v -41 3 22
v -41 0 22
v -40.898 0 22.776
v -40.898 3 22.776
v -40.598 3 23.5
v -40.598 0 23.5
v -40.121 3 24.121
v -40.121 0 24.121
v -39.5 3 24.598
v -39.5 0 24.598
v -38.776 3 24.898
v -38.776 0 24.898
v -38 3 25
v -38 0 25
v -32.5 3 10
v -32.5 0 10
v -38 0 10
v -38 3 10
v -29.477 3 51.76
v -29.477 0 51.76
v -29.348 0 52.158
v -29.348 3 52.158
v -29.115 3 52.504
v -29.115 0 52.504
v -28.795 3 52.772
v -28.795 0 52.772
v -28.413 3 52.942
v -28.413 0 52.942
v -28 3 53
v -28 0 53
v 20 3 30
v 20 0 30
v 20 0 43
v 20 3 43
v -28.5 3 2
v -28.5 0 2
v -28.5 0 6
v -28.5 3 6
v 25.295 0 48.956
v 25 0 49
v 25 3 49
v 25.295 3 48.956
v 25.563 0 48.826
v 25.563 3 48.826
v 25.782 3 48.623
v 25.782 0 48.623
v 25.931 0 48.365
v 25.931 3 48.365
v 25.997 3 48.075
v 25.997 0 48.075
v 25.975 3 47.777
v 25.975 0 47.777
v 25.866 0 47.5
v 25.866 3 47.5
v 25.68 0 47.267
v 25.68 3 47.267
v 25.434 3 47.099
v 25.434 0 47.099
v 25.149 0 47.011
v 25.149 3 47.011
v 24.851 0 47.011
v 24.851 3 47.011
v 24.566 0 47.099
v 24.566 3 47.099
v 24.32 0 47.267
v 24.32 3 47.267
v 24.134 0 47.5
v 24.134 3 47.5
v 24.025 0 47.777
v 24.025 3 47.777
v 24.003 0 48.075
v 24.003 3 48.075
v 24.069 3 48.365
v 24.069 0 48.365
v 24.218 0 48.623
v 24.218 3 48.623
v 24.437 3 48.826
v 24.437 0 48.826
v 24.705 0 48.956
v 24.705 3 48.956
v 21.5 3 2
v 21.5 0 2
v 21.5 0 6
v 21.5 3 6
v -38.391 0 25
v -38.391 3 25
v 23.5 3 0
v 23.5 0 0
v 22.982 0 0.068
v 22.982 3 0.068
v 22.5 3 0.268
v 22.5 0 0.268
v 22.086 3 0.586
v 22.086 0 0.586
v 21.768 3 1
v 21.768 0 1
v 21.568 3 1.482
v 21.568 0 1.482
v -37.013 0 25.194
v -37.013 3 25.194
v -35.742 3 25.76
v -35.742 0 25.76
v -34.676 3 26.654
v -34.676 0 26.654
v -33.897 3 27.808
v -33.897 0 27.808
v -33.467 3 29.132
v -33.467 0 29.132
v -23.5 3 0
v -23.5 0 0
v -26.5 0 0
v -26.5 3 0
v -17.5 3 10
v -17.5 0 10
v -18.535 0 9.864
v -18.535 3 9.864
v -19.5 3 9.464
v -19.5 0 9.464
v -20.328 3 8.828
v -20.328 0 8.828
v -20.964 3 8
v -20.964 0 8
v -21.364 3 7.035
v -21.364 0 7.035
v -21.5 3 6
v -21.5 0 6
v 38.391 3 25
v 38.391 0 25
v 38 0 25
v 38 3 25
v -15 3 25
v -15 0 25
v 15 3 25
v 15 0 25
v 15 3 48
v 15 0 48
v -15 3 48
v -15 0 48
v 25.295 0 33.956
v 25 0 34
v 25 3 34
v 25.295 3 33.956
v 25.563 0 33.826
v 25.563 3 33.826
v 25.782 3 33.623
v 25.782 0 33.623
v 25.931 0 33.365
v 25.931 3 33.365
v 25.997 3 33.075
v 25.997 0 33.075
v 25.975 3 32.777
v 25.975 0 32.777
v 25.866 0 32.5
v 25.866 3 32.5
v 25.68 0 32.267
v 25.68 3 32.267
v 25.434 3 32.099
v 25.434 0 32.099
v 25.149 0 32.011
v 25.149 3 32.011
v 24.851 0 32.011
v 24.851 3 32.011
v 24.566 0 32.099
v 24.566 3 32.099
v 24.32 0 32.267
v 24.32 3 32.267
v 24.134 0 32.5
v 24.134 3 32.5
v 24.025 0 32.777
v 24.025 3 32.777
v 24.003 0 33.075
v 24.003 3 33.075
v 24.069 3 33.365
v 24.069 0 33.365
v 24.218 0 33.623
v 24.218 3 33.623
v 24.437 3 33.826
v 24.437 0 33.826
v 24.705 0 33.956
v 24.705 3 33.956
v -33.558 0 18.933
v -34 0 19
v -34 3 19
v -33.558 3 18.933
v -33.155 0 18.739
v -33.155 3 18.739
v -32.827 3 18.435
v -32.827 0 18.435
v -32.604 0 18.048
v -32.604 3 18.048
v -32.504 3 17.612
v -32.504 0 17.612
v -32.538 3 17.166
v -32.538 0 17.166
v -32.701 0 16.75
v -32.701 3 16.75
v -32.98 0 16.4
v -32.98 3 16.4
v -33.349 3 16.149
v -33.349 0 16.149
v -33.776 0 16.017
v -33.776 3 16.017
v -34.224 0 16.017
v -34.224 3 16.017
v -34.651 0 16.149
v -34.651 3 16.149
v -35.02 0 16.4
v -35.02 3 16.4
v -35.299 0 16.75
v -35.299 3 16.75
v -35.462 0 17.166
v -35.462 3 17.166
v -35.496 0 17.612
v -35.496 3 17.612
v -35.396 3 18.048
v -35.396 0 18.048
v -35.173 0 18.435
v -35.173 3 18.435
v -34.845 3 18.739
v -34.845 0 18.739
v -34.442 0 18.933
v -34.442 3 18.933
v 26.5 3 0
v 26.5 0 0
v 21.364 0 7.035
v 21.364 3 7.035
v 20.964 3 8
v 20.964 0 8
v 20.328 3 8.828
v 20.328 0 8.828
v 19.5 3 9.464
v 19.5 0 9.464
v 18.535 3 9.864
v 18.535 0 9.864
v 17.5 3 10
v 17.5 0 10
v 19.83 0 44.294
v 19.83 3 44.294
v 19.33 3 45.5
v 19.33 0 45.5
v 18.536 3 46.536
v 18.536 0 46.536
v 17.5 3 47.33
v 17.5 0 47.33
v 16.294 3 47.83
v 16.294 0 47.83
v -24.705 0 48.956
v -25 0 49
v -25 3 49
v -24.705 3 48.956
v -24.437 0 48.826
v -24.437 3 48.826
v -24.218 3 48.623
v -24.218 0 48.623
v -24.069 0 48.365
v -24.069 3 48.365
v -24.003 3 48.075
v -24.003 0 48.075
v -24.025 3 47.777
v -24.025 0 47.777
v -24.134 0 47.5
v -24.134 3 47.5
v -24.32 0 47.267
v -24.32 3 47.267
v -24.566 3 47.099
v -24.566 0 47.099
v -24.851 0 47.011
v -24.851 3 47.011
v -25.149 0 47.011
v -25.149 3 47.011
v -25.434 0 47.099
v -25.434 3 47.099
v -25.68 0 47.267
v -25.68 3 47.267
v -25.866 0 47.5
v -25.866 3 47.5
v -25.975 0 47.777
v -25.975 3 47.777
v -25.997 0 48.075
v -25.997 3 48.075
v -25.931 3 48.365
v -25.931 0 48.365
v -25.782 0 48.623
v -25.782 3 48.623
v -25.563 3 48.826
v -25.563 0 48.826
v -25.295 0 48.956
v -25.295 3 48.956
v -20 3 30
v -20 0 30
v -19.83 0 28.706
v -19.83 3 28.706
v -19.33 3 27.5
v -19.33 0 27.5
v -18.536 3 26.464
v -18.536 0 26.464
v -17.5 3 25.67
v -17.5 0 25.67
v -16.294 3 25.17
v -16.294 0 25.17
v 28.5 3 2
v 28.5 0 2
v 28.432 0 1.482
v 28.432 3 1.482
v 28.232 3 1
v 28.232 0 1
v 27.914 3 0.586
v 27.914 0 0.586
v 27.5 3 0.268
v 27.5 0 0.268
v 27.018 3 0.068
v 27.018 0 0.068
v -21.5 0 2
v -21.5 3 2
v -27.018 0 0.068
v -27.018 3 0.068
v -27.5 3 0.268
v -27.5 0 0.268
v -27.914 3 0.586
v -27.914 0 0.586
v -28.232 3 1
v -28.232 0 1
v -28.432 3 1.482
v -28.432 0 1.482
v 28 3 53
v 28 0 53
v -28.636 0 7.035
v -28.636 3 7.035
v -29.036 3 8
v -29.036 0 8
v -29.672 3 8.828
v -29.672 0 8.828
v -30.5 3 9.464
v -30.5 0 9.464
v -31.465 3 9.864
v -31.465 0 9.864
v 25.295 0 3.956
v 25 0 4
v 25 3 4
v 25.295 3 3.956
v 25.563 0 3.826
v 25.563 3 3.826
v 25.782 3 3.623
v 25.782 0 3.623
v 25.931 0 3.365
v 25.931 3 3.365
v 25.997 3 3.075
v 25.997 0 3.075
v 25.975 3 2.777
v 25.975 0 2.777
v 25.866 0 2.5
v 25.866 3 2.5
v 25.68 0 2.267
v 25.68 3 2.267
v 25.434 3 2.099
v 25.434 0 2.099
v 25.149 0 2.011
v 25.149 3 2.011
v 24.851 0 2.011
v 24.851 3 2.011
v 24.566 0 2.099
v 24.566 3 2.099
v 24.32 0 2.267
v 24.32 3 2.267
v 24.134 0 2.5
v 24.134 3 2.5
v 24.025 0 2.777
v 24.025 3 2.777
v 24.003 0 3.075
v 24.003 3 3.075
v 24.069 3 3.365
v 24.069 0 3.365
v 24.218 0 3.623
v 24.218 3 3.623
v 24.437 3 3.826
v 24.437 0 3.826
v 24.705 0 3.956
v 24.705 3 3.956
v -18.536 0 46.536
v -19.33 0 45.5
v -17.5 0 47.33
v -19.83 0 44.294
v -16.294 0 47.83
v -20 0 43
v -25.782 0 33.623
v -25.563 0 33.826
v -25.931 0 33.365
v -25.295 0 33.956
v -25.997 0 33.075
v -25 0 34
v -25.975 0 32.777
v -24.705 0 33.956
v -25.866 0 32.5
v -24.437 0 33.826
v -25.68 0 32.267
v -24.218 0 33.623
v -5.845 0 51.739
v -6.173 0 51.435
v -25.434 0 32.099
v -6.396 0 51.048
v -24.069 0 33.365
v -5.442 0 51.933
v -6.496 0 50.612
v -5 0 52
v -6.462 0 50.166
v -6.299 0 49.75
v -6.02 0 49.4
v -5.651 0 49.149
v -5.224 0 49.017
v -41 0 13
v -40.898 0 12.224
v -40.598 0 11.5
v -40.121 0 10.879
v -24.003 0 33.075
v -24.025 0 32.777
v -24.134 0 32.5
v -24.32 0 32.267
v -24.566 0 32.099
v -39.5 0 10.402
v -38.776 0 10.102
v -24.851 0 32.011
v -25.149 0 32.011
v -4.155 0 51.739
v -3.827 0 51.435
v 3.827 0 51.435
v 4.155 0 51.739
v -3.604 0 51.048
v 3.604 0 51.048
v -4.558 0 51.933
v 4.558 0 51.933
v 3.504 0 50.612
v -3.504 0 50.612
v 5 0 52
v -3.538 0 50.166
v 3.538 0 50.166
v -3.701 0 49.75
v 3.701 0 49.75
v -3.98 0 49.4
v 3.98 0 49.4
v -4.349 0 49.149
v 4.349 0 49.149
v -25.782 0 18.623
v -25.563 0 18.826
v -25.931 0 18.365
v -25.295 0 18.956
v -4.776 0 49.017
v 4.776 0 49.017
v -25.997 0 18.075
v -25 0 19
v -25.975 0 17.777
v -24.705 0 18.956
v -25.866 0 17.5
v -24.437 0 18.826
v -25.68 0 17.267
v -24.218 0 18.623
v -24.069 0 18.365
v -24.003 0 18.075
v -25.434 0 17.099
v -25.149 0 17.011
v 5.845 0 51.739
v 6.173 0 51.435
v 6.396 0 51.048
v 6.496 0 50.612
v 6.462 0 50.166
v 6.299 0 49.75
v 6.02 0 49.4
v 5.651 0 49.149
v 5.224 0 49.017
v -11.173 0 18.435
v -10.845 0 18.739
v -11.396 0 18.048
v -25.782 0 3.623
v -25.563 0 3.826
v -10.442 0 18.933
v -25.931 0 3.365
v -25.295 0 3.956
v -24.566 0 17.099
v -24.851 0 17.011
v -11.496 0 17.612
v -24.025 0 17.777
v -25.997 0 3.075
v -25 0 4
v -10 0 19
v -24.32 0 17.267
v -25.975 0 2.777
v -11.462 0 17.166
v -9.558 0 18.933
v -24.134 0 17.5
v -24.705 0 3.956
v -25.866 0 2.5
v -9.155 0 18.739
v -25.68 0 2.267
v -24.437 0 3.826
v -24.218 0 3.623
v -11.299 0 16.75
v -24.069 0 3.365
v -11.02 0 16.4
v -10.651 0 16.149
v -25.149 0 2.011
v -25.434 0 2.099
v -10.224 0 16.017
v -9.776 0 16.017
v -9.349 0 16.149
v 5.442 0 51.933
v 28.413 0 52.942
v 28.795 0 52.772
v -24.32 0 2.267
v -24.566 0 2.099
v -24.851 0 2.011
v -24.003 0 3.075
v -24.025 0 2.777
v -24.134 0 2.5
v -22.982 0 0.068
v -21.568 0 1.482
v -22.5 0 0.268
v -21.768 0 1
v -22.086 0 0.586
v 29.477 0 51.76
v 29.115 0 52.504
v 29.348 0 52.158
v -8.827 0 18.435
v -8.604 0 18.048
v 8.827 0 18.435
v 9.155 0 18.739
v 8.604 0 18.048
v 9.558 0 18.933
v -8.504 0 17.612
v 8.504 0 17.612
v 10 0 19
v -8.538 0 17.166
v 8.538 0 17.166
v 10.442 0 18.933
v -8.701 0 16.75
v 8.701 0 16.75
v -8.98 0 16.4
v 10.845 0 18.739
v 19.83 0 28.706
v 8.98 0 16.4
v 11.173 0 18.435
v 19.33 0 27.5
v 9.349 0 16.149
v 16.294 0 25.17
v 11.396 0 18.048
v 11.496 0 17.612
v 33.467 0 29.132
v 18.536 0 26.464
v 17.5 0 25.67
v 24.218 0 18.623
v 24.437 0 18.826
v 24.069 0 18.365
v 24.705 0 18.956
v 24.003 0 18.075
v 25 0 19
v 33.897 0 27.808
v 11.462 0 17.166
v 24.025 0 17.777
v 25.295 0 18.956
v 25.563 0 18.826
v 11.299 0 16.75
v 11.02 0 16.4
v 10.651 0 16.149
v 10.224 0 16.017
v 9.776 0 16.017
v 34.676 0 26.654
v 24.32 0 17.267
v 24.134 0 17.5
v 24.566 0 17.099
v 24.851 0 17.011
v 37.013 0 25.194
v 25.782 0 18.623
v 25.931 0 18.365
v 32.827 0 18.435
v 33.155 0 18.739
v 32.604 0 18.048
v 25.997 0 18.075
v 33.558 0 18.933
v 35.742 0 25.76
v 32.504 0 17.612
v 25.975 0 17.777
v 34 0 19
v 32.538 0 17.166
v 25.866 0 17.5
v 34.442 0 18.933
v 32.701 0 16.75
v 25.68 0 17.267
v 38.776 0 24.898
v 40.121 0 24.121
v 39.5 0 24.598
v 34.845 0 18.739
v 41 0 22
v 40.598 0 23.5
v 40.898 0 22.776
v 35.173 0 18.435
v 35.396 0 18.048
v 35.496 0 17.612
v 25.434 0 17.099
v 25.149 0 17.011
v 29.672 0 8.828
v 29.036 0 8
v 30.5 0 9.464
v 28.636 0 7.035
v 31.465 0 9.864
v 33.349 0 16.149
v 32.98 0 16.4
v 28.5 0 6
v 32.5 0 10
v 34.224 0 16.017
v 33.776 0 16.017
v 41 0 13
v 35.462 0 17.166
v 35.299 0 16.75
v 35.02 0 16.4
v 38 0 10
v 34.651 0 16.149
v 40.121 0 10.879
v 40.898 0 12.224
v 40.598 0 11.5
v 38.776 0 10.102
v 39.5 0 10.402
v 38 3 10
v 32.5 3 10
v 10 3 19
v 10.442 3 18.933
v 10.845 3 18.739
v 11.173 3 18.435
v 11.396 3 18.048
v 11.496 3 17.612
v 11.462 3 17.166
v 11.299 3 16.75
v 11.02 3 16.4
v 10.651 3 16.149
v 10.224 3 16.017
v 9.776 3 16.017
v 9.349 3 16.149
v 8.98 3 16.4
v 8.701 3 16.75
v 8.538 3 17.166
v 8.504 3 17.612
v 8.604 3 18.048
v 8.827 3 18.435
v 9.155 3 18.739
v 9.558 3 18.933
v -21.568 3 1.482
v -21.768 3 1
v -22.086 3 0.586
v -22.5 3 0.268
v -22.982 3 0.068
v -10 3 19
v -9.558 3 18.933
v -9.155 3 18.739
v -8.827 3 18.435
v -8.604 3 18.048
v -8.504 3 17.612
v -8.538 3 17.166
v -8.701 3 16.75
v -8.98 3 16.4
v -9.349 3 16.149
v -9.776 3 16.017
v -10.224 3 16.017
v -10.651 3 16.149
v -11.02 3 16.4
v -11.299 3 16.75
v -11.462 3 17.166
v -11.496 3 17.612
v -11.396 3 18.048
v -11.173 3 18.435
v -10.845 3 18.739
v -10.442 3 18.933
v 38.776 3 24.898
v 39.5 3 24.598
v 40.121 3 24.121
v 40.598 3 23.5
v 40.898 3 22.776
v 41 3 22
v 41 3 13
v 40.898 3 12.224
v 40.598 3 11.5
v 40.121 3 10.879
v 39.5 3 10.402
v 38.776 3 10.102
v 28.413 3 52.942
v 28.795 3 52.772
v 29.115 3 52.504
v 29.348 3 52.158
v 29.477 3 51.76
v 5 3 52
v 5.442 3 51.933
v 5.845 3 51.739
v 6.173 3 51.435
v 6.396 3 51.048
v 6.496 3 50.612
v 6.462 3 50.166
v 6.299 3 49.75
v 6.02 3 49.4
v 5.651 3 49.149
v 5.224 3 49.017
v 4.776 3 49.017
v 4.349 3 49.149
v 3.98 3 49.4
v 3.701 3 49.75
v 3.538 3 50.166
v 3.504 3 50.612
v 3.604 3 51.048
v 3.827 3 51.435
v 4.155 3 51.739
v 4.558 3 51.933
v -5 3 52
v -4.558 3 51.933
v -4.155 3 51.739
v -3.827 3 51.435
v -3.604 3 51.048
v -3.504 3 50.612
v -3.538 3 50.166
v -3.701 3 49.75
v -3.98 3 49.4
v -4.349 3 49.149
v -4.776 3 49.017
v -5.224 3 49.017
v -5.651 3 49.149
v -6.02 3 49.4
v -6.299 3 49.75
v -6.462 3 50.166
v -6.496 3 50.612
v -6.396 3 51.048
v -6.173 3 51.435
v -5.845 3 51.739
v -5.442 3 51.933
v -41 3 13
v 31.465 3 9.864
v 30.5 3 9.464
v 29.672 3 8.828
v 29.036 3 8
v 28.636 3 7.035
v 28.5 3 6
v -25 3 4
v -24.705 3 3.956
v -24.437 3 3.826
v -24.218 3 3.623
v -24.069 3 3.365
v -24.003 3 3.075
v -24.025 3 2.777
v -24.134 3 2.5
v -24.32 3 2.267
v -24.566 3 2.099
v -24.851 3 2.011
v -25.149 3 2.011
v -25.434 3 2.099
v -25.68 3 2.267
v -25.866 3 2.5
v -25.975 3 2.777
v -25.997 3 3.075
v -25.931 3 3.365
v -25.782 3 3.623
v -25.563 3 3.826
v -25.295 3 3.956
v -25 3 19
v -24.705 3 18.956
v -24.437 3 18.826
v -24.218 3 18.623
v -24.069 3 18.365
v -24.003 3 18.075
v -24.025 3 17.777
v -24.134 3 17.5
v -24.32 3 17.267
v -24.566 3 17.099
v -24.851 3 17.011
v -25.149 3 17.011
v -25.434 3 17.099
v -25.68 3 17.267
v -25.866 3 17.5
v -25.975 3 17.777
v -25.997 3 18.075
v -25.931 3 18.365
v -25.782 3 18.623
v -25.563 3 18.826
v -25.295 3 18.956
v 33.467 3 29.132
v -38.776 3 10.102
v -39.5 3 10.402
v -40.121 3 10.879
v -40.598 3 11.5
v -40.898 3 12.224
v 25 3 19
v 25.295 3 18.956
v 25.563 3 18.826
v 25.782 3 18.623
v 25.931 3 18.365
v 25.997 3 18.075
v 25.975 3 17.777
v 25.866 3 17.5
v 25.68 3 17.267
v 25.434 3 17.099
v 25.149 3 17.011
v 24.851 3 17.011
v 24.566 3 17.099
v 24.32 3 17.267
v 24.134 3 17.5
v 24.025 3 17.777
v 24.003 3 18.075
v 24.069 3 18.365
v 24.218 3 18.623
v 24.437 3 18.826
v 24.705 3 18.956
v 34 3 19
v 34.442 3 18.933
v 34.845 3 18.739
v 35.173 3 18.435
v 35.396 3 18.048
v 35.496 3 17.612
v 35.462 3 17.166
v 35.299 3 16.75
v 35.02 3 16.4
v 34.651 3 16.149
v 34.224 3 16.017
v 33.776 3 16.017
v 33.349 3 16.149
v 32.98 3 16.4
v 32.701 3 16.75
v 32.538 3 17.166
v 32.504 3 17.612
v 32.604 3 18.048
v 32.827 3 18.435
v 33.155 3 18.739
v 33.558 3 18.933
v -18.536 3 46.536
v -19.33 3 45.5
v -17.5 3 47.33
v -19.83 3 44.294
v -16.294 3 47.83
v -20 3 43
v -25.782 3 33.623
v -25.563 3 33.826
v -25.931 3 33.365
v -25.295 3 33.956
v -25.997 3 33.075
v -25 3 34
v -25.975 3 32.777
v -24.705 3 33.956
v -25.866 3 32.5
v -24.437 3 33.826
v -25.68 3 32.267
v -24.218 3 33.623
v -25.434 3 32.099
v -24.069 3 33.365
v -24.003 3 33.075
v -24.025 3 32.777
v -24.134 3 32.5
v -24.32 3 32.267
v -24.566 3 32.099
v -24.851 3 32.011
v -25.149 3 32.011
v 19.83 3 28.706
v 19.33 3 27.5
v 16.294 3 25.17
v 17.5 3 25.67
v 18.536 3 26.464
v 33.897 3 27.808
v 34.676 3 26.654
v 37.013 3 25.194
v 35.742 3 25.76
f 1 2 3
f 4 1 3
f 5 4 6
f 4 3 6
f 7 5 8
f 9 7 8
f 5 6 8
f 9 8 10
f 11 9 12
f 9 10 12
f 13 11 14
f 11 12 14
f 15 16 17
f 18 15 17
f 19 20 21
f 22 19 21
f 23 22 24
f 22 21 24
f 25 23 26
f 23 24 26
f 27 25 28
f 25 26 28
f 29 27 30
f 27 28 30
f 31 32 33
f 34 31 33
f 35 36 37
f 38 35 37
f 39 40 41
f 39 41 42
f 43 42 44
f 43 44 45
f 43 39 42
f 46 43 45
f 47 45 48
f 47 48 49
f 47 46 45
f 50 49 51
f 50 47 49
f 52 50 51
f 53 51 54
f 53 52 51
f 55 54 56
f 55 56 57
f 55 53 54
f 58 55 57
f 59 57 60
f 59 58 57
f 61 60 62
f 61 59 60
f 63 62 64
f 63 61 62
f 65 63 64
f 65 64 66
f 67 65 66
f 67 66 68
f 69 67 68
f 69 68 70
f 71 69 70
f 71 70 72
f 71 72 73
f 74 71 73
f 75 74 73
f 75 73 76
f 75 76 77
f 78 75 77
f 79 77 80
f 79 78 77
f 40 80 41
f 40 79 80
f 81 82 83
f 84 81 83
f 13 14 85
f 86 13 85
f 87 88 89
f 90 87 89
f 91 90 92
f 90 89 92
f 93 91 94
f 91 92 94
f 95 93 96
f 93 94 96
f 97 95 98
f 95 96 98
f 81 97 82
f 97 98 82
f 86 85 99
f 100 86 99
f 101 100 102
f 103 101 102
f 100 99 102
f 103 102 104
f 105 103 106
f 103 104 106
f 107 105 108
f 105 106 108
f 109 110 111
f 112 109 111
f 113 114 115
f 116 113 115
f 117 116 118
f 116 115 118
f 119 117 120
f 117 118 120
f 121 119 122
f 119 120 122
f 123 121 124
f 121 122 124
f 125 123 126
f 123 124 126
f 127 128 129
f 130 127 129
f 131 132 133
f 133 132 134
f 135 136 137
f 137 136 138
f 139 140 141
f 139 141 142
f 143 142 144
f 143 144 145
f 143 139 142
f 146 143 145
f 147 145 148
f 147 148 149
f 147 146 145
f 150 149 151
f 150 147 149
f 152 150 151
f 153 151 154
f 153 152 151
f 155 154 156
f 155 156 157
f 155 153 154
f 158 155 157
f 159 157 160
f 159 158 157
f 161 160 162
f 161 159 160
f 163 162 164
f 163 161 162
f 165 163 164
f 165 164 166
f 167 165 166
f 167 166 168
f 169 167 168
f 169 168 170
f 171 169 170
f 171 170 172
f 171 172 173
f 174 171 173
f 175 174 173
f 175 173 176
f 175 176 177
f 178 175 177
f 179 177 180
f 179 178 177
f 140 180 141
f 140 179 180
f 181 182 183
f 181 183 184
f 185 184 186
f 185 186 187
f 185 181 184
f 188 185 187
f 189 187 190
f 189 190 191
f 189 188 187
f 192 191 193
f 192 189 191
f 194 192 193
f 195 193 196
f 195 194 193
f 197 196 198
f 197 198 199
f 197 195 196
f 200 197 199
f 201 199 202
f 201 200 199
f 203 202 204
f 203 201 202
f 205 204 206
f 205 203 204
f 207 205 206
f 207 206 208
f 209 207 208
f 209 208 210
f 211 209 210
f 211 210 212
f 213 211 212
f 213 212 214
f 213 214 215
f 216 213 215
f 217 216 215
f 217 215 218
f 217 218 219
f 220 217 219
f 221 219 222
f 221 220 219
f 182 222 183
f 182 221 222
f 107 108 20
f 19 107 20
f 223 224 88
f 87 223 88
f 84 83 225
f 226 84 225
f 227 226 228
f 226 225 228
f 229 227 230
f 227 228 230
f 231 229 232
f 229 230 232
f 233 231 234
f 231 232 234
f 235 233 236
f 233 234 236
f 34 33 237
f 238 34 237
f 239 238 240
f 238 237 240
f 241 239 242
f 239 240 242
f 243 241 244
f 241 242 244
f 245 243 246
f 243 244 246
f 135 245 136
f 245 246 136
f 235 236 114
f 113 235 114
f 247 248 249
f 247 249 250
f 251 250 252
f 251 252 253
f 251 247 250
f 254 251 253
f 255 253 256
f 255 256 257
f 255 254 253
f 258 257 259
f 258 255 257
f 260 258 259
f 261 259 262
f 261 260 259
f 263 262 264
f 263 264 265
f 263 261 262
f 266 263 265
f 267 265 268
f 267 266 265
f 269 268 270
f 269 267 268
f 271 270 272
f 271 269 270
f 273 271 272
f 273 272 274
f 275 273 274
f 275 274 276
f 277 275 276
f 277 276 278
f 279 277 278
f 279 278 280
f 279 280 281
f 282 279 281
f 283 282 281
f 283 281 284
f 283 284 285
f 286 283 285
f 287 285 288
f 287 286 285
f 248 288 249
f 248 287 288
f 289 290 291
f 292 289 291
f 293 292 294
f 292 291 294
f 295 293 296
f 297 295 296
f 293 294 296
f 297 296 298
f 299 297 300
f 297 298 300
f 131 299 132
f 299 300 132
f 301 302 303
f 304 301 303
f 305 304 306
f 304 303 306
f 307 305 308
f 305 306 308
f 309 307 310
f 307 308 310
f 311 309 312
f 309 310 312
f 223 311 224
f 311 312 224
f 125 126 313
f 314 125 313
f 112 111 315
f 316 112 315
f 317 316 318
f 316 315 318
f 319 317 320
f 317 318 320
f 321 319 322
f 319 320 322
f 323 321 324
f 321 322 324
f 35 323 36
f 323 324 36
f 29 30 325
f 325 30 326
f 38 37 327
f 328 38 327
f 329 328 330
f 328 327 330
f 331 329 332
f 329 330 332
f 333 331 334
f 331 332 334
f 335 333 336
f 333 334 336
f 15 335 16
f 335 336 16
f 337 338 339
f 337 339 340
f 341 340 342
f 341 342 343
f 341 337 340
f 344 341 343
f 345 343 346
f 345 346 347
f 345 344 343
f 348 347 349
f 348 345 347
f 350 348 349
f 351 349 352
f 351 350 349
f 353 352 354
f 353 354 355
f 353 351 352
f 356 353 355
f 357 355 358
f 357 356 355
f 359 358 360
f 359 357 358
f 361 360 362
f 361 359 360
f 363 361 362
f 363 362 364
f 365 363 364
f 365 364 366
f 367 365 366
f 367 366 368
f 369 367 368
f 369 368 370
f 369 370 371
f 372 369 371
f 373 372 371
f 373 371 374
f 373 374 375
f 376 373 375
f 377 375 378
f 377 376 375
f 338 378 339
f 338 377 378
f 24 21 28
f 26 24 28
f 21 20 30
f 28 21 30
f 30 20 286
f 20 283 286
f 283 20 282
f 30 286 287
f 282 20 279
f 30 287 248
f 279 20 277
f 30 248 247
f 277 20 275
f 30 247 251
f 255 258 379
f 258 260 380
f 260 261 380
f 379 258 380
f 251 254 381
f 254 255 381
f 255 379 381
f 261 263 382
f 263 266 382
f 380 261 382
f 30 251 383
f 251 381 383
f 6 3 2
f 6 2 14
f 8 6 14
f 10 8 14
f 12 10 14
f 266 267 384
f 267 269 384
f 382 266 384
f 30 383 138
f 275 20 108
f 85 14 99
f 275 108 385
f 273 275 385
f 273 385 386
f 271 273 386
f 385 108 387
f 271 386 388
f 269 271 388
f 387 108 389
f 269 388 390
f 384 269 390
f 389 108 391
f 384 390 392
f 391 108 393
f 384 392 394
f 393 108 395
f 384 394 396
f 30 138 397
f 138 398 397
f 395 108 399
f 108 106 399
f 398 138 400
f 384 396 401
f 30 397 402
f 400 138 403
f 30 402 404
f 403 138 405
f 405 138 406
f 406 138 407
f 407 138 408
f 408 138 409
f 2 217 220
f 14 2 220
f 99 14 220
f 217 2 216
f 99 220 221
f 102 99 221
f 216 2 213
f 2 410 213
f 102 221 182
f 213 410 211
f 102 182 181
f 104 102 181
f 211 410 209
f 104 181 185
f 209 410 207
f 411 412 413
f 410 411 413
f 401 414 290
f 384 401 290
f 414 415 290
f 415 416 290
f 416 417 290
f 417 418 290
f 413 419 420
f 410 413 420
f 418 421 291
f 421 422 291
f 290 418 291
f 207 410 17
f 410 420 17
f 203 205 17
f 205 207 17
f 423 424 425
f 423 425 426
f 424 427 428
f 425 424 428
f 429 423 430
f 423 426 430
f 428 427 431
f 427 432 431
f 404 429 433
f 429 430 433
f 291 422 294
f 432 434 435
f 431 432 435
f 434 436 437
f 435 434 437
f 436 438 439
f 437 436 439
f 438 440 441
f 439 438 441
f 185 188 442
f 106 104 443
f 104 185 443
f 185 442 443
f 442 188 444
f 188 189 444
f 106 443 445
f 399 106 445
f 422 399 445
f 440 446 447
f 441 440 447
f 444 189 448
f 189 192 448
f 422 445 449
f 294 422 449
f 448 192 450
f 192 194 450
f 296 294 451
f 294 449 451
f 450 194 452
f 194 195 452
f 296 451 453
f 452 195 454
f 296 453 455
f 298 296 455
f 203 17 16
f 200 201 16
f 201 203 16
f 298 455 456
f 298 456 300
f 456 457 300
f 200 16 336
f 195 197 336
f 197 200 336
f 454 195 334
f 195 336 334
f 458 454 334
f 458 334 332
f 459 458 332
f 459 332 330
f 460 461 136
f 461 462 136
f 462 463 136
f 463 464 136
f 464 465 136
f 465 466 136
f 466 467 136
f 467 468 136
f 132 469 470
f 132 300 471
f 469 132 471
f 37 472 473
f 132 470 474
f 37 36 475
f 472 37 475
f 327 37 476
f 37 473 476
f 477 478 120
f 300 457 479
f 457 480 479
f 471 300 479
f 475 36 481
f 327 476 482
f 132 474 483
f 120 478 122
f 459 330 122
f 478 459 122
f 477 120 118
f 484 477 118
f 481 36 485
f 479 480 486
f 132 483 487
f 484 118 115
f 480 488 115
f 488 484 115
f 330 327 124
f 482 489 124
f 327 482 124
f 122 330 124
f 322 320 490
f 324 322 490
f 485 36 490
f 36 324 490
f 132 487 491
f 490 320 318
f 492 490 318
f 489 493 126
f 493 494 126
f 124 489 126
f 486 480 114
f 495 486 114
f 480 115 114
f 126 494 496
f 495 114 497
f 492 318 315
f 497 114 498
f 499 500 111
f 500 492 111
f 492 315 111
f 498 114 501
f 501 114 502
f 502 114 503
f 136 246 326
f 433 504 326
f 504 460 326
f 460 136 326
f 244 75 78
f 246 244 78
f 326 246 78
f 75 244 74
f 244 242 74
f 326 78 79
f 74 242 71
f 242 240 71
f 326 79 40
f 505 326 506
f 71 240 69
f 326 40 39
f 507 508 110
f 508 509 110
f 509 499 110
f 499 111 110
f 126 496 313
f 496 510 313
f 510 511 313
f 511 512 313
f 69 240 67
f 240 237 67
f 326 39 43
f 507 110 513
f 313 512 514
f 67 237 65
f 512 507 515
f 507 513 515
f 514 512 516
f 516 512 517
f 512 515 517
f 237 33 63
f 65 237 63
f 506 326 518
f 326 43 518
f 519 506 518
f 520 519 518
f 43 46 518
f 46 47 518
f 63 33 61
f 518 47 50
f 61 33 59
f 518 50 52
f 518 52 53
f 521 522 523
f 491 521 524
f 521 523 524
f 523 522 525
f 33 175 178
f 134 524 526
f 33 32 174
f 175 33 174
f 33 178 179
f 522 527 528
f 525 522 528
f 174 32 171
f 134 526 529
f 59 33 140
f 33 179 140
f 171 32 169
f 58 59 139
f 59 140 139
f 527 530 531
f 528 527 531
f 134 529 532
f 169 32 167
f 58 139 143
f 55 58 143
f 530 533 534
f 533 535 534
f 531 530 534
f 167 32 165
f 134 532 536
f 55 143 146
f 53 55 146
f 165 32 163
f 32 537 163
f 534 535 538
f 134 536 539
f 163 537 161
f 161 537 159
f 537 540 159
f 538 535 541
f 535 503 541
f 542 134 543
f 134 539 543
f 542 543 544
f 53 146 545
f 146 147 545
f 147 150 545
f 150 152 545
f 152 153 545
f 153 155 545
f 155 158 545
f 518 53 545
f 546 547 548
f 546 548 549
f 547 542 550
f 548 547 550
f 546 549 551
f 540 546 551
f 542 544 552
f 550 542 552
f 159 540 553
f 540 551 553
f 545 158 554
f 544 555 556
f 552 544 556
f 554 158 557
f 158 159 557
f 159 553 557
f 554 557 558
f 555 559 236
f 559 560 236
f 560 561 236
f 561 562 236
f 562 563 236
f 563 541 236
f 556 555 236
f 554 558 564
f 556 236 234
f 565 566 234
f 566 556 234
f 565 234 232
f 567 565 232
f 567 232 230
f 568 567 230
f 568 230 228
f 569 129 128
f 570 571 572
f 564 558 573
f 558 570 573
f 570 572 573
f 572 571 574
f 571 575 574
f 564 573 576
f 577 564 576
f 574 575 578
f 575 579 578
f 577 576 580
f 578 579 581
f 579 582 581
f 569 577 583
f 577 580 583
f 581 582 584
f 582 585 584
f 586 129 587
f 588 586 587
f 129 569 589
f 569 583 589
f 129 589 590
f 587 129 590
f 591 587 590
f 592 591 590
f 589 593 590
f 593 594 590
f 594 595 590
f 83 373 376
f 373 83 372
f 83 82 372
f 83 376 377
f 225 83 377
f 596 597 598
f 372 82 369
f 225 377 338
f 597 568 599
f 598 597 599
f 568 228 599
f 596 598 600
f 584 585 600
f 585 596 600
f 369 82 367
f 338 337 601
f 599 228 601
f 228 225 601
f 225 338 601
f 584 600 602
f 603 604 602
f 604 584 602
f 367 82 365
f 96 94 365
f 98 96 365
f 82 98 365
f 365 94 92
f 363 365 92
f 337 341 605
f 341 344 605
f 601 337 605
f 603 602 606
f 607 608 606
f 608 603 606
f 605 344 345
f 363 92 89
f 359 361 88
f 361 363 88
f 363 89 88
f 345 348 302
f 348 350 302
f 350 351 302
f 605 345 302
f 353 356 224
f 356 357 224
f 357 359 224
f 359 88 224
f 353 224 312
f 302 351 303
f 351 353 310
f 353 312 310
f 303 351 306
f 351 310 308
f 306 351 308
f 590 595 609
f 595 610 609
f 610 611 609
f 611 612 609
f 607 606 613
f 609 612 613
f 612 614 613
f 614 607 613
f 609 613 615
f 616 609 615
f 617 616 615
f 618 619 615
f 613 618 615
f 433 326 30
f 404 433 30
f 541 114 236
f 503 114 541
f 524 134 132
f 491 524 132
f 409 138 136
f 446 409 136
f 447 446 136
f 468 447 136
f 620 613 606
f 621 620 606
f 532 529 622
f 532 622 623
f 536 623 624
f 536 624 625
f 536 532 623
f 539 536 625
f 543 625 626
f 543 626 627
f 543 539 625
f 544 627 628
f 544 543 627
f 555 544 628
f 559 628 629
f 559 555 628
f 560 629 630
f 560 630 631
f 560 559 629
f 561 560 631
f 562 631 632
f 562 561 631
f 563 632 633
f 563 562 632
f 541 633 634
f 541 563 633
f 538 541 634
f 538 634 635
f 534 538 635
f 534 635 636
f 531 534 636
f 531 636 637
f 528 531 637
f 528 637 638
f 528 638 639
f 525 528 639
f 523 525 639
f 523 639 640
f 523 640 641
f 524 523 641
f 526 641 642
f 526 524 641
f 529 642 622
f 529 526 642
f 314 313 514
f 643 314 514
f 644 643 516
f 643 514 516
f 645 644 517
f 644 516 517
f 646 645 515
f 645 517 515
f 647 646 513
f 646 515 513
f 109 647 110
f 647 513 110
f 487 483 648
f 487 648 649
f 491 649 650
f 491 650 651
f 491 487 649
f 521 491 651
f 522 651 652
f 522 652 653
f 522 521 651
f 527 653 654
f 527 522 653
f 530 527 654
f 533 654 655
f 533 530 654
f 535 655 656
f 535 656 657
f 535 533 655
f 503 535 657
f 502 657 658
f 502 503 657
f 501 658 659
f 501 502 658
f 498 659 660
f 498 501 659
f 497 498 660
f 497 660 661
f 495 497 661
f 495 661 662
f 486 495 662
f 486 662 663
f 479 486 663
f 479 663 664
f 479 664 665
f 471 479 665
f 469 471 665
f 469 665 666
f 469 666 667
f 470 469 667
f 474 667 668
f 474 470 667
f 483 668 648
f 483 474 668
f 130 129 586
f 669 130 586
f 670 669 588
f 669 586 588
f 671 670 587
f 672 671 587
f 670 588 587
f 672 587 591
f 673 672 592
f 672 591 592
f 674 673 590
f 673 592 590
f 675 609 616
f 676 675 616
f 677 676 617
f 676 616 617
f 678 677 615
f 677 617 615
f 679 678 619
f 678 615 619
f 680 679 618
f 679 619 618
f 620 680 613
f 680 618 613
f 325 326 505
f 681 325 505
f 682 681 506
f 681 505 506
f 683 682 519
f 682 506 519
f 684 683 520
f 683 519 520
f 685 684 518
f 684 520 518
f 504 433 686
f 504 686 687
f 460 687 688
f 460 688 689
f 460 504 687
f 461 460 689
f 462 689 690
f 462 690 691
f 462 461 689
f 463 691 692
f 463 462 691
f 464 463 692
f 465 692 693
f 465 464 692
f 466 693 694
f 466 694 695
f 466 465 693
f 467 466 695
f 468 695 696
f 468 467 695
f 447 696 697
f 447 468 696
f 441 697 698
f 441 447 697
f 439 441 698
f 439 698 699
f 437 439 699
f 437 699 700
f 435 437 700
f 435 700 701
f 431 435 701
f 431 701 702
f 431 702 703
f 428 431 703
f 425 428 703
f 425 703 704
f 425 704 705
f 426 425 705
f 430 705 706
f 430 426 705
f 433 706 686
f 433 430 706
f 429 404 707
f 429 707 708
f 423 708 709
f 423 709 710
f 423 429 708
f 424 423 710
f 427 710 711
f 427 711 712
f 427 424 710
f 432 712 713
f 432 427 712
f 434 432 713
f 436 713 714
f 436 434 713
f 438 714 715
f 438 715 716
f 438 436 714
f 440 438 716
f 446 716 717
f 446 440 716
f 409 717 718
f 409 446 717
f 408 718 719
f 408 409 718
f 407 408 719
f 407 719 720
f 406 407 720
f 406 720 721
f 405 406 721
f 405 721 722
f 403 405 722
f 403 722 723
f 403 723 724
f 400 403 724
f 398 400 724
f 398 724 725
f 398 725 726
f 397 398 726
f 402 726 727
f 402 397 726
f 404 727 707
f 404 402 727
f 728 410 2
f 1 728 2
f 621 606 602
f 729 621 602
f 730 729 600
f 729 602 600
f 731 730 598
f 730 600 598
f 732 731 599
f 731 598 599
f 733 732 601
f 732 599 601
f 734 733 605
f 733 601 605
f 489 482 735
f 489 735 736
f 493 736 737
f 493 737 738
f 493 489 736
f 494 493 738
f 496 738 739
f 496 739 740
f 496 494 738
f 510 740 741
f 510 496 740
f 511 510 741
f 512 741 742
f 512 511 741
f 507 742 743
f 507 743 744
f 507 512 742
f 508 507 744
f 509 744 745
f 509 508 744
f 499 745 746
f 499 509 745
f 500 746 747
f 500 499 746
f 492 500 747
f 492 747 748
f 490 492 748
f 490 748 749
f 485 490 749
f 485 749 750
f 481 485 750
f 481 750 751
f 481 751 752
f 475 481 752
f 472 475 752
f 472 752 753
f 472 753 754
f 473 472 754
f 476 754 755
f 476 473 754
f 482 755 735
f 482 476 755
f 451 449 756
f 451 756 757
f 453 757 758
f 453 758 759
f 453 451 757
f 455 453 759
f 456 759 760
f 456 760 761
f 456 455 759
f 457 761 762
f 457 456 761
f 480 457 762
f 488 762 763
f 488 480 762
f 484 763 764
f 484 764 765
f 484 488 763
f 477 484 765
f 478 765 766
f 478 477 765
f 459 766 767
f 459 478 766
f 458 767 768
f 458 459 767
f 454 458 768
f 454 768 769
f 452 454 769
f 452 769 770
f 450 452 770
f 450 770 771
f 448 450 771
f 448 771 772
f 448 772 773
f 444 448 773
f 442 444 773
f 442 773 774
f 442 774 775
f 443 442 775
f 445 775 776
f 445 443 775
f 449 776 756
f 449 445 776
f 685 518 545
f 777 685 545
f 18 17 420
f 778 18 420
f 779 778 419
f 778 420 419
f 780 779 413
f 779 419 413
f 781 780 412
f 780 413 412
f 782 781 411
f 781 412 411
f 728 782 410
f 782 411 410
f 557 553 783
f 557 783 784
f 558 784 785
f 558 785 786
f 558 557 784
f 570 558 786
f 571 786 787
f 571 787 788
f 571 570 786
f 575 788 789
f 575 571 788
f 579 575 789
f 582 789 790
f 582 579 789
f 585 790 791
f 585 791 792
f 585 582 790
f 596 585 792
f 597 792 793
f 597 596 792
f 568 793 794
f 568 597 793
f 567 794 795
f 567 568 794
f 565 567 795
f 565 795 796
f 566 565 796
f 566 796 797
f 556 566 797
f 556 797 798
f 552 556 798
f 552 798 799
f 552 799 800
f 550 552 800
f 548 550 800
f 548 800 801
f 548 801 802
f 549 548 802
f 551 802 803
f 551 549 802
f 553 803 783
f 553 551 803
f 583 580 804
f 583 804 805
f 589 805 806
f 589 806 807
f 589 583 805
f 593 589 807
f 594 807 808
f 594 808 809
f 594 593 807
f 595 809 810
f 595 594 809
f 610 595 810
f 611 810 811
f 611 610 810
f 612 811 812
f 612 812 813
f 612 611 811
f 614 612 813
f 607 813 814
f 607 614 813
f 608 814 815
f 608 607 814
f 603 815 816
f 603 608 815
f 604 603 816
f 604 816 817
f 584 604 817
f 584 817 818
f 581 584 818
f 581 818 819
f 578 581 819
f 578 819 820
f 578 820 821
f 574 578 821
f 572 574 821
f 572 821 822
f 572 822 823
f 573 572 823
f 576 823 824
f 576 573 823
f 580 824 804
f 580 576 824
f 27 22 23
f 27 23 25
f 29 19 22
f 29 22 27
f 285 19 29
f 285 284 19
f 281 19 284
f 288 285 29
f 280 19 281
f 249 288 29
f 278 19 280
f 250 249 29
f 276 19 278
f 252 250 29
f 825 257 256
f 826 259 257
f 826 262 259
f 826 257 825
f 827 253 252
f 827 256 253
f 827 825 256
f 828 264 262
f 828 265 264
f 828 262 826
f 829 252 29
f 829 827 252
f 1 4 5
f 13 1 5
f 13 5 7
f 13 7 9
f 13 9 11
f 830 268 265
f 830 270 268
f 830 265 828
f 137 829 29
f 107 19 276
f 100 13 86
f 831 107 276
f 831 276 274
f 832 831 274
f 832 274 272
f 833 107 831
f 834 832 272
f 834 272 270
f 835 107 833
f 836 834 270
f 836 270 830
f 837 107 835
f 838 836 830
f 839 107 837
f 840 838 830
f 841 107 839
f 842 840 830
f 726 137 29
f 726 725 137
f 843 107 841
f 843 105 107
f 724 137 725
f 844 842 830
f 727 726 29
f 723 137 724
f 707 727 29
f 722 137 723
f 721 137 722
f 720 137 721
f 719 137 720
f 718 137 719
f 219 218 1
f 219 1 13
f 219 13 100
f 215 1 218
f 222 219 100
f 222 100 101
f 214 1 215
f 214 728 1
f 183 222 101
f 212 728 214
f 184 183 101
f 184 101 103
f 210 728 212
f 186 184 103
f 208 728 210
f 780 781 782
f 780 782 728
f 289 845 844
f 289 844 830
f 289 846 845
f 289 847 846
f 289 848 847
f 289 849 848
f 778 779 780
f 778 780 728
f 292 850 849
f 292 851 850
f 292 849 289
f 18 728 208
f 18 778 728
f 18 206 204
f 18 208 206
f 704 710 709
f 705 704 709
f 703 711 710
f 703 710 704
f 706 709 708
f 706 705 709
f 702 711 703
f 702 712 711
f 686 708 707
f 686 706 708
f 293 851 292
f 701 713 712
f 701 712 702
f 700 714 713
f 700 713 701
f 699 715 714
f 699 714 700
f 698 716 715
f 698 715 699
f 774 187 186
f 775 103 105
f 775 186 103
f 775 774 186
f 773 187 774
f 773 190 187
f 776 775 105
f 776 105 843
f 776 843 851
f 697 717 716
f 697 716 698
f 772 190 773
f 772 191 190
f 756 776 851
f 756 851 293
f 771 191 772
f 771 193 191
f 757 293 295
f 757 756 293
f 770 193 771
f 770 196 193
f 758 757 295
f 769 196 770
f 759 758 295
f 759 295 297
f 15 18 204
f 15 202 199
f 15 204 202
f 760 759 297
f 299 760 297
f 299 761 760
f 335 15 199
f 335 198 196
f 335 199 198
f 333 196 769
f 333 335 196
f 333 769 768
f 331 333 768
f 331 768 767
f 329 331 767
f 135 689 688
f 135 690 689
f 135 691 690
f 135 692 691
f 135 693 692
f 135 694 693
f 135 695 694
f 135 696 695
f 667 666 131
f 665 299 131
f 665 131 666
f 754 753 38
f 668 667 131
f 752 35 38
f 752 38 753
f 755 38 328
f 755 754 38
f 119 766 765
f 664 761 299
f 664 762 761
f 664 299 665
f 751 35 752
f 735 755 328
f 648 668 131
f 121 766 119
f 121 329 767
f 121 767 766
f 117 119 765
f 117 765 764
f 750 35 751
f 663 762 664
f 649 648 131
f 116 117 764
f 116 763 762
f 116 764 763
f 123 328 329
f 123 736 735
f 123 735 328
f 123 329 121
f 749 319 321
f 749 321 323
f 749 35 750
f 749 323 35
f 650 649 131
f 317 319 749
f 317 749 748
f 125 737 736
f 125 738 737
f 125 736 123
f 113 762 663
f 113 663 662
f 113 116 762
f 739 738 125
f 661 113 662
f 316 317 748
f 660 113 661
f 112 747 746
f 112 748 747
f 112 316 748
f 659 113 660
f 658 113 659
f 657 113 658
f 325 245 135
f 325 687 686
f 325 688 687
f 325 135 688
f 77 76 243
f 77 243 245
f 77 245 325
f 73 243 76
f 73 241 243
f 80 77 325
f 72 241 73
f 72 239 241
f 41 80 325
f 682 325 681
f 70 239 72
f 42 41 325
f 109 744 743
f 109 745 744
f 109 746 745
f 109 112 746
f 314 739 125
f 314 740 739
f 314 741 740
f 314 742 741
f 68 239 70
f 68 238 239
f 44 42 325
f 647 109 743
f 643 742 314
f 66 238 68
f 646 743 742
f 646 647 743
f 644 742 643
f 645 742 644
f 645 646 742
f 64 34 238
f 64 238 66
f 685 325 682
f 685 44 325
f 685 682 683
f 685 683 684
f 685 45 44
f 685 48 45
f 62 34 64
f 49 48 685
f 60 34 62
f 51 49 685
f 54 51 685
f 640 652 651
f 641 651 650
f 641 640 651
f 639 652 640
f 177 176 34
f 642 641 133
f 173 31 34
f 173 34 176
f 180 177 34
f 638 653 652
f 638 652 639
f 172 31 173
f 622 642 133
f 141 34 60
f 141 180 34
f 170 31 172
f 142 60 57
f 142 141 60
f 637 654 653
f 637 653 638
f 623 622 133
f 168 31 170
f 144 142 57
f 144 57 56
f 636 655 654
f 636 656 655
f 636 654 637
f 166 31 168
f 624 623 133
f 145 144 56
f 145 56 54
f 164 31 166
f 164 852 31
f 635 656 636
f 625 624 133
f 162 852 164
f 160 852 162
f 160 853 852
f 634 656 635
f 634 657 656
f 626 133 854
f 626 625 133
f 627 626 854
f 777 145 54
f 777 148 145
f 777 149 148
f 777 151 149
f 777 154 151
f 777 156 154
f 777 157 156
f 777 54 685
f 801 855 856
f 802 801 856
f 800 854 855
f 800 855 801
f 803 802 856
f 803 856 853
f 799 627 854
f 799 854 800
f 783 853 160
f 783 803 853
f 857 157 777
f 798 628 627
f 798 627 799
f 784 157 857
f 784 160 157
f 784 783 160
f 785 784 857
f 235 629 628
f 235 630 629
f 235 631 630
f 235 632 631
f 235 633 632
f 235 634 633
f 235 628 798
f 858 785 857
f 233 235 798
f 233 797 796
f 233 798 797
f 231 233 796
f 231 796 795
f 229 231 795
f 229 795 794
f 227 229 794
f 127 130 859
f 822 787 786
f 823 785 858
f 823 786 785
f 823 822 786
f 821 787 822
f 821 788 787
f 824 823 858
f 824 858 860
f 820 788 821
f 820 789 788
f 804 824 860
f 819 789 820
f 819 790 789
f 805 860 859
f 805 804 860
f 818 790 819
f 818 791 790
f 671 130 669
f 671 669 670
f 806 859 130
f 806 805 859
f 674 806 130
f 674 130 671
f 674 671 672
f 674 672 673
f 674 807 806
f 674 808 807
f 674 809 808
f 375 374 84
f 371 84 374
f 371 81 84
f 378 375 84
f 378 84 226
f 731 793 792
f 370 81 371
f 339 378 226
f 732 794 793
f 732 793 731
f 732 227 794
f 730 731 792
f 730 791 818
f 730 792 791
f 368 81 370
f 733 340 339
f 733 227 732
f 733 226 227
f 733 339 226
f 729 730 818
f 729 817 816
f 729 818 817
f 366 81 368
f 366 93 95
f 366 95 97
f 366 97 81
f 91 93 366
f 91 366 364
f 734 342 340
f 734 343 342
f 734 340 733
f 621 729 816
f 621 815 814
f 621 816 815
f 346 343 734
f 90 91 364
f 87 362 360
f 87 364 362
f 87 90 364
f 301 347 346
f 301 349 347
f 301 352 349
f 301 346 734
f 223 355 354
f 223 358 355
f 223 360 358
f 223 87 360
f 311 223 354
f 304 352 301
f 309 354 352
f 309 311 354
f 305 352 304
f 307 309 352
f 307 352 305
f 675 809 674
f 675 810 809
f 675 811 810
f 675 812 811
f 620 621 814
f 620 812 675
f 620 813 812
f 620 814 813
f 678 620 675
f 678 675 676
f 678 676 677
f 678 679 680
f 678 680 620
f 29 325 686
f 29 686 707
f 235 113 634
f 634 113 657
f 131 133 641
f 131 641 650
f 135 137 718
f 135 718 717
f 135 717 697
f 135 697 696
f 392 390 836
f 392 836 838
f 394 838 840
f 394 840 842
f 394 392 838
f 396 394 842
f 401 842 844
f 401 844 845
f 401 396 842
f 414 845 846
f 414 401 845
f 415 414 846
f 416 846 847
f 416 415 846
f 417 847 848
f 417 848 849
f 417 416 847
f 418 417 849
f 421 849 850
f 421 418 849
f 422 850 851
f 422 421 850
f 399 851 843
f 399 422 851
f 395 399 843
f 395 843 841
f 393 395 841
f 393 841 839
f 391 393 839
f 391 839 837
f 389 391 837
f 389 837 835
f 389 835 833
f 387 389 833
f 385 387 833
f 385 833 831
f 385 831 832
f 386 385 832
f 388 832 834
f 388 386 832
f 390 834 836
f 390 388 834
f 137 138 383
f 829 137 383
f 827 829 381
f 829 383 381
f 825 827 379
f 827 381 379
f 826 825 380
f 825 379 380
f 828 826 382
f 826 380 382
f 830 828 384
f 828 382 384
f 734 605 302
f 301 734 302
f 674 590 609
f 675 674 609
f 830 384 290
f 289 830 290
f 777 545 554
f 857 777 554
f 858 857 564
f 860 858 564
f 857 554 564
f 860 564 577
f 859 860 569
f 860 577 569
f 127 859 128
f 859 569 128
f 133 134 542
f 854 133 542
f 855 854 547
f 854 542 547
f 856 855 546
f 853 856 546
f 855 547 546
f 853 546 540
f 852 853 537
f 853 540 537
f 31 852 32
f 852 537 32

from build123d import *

# Parameters (mm, degrees)
SKETCH_1_R      = 1
SKETCH_1_R_2    = 1.5
EXTRUDE_1_DEPTH = 3


with BuildPart() as part:
    # 草图1 → 凸台-拉伸1 (new body)
    with BuildSketch(Plane(origin=(0, 0, 0), x_dir=(1, 0, 0), z_dir=(0, 1, 0))):
        with BuildLine():
            Line((-28.5, -2), (-28.5, -6))
            ThreePointArc((-28.5, -6), (-29.671572875, -8.828427125), (-32.5, -10))
            Line((-32.5, -10), (-38, -10))
            ThreePointArc((-38, -10), (-40.121320344, -10.878679656), (-41, -13))
            Line((-41, -13), (-41, -22))
            ThreePointArc((-41, -22), (-40.121320344, -24.121320344), (-38, -25))
            Line((-38, -25), (-38.391303062, -25))
            ThreePointArc((-38.391303062, -25), (-35.177365014, -26.169777784), (-33.467264297, -29.131759112))
            Line((-33.467264297, -29.131759112), (-29.47721163, -51.760472267))
            ThreePointArc((-29.47721163, -51.760472267), (-28.964181415, -52.649066665), (-28, -53))
            Line((-28, -53), (-22, -53))
            Line((-22, -53), (22, -53))
            Line((22, -53), (28, -53))
            ThreePointArc((28, -53), (28.964181415, -52.649066665), (29.47721163, -51.760472267))
            Line((29.47721163, -51.760472267), (33.467264297, -29.131759112))
            ThreePointArc((33.467264297, -29.131759112), (35.177365014, -26.169777784), (38.391303062, -25))
            Line((38.391303062, -25), (38, -25))
            ThreePointArc((38, -25), (40.121320344, -24.121320344), (41, -22))
            Line((41, -22), (41, -13))
            ThreePointArc((41, -13), (40.121320344, -10.878679656), (38, -10))
            Line((38, -10), (32.5, -10))
            ThreePointArc((32.5, -10), (29.671572875, -8.828427125), (28.5, -6))
            Line((28.5, -6), (28.5, -2))
            ThreePointArc((28.5, -2), (27.914213562, -0.585786438), (26.5, 0))
            Line((26.5, 0), (23.5, 0))
            ThreePointArc((23.5, 0), (22.085786438, -0.585786438), (21.5, -2))
            Line((21.5, -2), (21.5, -6))
            ThreePointArc((21.5, -6), (20.328427125, -8.828427125), (17.5, -10))
            Line((17.5, -10), (-17.5, -10))
            ThreePointArc((-17.5, -10), (-20.328427125, -8.828427125), (-21.5, -6))
            Line((-21.5, -6), (-21.5, -2))
            ThreePointArc((-21.5, -2), (-22.085786438, -0.585786438), (-23.5, 0))
            Line((-23.5, 0), (-26.5, 0))
            ThreePointArc((-26.5, 0), (-27.914213562, -0.585786438), (-28.5, -2))
        make_face()
        with Locations(Location((-25, -48, 0), (0, 0, 270))):
            Circle(SKETCH_1_R, mode=Mode.SUBTRACT)
        with Locations(Location((-25, -33, 0), (0, 0, 270))):
            Circle(SKETCH_1_R, mode=Mode.SUBTRACT)
        with Locations(Location((-25, -18, 0), (0, 0, 270))):
            Circle(SKETCH_1_R, mode=Mode.SUBTRACT)
        with Locations(Location((-34, -17.5, 0), (0, 0, 270))):
            Circle(SKETCH_1_R_2, mode=Mode.SUBTRACT)
        with Locations(Location((-10, -17.5, 0), (0, 0, 270))):
            Circle(SKETCH_1_R_2, mode=Mode.SUBTRACT)
        with Locations(Location((10, -17.5, 0), (0, 0, 270))):
            Circle(SKETCH_1_R_2, mode=Mode.SUBTRACT)
        with Locations(Location((34, -17.5, 0), (0, 0, 270))):
            Circle(SKETCH_1_R_2, mode=Mode.SUBTRACT)
        with Locations(Location((25, -18, 0), (0, 0, 270))):
            Circle(SKETCH_1_R, mode=Mode.SUBTRACT)
        with Locations(Location((25, -33, 0), (0, 0, 270))):
            Circle(SKETCH_1_R, mode=Mode.SUBTRACT)
        with Locations(Location((25, -48, 0), (0, 0, 270))):
            Circle(SKETCH_1_R, mode=Mode.SUBTRACT)
        with Locations(Location((-25, -3, 0), (0, 0, 270))):
            Circle(SKETCH_1_R, mode=Mode.SUBTRACT)
        with Locations(Location((25, -3, 0), (0, 0, 270))):
            Circle(SKETCH_1_R, mode=Mode.SUBTRACT)
        with Locations(Location((5, -50.5, 0), (0, 0, 270))):
            Circle(SKETCH_1_R_2, mode=Mode.SUBTRACT)
        with Locations(Location((-5, -50.5, 0), (0, 0, 270))):
            Circle(SKETCH_1_R_2, mode=Mode.SUBTRACT)
        with BuildLine():
            Line((-20, -43), (-20, -30))
            ThreePointArc((-20, -30), (-18.535533906, -26.464466094), (-15, -25))
            Line((-15, -25), (15, -25))
            ThreePointArc((15, -25), (18.535533906, -26.464466094), (20, -30))
            Line((20, -30), (20, -43))
            ThreePointArc((20, -43), (18.535533906, -46.535533906), (15, -48))
            Line((15, -48), (-15, -48))
            ThreePointArc((-15, -48), (-18.535533906, -46.535533906), (-20, -43))
        make_face(mode=Mode.SUBTRACT)
    extrude(amount=EXTRUDE_1_DEPTH)


solid = part.part
